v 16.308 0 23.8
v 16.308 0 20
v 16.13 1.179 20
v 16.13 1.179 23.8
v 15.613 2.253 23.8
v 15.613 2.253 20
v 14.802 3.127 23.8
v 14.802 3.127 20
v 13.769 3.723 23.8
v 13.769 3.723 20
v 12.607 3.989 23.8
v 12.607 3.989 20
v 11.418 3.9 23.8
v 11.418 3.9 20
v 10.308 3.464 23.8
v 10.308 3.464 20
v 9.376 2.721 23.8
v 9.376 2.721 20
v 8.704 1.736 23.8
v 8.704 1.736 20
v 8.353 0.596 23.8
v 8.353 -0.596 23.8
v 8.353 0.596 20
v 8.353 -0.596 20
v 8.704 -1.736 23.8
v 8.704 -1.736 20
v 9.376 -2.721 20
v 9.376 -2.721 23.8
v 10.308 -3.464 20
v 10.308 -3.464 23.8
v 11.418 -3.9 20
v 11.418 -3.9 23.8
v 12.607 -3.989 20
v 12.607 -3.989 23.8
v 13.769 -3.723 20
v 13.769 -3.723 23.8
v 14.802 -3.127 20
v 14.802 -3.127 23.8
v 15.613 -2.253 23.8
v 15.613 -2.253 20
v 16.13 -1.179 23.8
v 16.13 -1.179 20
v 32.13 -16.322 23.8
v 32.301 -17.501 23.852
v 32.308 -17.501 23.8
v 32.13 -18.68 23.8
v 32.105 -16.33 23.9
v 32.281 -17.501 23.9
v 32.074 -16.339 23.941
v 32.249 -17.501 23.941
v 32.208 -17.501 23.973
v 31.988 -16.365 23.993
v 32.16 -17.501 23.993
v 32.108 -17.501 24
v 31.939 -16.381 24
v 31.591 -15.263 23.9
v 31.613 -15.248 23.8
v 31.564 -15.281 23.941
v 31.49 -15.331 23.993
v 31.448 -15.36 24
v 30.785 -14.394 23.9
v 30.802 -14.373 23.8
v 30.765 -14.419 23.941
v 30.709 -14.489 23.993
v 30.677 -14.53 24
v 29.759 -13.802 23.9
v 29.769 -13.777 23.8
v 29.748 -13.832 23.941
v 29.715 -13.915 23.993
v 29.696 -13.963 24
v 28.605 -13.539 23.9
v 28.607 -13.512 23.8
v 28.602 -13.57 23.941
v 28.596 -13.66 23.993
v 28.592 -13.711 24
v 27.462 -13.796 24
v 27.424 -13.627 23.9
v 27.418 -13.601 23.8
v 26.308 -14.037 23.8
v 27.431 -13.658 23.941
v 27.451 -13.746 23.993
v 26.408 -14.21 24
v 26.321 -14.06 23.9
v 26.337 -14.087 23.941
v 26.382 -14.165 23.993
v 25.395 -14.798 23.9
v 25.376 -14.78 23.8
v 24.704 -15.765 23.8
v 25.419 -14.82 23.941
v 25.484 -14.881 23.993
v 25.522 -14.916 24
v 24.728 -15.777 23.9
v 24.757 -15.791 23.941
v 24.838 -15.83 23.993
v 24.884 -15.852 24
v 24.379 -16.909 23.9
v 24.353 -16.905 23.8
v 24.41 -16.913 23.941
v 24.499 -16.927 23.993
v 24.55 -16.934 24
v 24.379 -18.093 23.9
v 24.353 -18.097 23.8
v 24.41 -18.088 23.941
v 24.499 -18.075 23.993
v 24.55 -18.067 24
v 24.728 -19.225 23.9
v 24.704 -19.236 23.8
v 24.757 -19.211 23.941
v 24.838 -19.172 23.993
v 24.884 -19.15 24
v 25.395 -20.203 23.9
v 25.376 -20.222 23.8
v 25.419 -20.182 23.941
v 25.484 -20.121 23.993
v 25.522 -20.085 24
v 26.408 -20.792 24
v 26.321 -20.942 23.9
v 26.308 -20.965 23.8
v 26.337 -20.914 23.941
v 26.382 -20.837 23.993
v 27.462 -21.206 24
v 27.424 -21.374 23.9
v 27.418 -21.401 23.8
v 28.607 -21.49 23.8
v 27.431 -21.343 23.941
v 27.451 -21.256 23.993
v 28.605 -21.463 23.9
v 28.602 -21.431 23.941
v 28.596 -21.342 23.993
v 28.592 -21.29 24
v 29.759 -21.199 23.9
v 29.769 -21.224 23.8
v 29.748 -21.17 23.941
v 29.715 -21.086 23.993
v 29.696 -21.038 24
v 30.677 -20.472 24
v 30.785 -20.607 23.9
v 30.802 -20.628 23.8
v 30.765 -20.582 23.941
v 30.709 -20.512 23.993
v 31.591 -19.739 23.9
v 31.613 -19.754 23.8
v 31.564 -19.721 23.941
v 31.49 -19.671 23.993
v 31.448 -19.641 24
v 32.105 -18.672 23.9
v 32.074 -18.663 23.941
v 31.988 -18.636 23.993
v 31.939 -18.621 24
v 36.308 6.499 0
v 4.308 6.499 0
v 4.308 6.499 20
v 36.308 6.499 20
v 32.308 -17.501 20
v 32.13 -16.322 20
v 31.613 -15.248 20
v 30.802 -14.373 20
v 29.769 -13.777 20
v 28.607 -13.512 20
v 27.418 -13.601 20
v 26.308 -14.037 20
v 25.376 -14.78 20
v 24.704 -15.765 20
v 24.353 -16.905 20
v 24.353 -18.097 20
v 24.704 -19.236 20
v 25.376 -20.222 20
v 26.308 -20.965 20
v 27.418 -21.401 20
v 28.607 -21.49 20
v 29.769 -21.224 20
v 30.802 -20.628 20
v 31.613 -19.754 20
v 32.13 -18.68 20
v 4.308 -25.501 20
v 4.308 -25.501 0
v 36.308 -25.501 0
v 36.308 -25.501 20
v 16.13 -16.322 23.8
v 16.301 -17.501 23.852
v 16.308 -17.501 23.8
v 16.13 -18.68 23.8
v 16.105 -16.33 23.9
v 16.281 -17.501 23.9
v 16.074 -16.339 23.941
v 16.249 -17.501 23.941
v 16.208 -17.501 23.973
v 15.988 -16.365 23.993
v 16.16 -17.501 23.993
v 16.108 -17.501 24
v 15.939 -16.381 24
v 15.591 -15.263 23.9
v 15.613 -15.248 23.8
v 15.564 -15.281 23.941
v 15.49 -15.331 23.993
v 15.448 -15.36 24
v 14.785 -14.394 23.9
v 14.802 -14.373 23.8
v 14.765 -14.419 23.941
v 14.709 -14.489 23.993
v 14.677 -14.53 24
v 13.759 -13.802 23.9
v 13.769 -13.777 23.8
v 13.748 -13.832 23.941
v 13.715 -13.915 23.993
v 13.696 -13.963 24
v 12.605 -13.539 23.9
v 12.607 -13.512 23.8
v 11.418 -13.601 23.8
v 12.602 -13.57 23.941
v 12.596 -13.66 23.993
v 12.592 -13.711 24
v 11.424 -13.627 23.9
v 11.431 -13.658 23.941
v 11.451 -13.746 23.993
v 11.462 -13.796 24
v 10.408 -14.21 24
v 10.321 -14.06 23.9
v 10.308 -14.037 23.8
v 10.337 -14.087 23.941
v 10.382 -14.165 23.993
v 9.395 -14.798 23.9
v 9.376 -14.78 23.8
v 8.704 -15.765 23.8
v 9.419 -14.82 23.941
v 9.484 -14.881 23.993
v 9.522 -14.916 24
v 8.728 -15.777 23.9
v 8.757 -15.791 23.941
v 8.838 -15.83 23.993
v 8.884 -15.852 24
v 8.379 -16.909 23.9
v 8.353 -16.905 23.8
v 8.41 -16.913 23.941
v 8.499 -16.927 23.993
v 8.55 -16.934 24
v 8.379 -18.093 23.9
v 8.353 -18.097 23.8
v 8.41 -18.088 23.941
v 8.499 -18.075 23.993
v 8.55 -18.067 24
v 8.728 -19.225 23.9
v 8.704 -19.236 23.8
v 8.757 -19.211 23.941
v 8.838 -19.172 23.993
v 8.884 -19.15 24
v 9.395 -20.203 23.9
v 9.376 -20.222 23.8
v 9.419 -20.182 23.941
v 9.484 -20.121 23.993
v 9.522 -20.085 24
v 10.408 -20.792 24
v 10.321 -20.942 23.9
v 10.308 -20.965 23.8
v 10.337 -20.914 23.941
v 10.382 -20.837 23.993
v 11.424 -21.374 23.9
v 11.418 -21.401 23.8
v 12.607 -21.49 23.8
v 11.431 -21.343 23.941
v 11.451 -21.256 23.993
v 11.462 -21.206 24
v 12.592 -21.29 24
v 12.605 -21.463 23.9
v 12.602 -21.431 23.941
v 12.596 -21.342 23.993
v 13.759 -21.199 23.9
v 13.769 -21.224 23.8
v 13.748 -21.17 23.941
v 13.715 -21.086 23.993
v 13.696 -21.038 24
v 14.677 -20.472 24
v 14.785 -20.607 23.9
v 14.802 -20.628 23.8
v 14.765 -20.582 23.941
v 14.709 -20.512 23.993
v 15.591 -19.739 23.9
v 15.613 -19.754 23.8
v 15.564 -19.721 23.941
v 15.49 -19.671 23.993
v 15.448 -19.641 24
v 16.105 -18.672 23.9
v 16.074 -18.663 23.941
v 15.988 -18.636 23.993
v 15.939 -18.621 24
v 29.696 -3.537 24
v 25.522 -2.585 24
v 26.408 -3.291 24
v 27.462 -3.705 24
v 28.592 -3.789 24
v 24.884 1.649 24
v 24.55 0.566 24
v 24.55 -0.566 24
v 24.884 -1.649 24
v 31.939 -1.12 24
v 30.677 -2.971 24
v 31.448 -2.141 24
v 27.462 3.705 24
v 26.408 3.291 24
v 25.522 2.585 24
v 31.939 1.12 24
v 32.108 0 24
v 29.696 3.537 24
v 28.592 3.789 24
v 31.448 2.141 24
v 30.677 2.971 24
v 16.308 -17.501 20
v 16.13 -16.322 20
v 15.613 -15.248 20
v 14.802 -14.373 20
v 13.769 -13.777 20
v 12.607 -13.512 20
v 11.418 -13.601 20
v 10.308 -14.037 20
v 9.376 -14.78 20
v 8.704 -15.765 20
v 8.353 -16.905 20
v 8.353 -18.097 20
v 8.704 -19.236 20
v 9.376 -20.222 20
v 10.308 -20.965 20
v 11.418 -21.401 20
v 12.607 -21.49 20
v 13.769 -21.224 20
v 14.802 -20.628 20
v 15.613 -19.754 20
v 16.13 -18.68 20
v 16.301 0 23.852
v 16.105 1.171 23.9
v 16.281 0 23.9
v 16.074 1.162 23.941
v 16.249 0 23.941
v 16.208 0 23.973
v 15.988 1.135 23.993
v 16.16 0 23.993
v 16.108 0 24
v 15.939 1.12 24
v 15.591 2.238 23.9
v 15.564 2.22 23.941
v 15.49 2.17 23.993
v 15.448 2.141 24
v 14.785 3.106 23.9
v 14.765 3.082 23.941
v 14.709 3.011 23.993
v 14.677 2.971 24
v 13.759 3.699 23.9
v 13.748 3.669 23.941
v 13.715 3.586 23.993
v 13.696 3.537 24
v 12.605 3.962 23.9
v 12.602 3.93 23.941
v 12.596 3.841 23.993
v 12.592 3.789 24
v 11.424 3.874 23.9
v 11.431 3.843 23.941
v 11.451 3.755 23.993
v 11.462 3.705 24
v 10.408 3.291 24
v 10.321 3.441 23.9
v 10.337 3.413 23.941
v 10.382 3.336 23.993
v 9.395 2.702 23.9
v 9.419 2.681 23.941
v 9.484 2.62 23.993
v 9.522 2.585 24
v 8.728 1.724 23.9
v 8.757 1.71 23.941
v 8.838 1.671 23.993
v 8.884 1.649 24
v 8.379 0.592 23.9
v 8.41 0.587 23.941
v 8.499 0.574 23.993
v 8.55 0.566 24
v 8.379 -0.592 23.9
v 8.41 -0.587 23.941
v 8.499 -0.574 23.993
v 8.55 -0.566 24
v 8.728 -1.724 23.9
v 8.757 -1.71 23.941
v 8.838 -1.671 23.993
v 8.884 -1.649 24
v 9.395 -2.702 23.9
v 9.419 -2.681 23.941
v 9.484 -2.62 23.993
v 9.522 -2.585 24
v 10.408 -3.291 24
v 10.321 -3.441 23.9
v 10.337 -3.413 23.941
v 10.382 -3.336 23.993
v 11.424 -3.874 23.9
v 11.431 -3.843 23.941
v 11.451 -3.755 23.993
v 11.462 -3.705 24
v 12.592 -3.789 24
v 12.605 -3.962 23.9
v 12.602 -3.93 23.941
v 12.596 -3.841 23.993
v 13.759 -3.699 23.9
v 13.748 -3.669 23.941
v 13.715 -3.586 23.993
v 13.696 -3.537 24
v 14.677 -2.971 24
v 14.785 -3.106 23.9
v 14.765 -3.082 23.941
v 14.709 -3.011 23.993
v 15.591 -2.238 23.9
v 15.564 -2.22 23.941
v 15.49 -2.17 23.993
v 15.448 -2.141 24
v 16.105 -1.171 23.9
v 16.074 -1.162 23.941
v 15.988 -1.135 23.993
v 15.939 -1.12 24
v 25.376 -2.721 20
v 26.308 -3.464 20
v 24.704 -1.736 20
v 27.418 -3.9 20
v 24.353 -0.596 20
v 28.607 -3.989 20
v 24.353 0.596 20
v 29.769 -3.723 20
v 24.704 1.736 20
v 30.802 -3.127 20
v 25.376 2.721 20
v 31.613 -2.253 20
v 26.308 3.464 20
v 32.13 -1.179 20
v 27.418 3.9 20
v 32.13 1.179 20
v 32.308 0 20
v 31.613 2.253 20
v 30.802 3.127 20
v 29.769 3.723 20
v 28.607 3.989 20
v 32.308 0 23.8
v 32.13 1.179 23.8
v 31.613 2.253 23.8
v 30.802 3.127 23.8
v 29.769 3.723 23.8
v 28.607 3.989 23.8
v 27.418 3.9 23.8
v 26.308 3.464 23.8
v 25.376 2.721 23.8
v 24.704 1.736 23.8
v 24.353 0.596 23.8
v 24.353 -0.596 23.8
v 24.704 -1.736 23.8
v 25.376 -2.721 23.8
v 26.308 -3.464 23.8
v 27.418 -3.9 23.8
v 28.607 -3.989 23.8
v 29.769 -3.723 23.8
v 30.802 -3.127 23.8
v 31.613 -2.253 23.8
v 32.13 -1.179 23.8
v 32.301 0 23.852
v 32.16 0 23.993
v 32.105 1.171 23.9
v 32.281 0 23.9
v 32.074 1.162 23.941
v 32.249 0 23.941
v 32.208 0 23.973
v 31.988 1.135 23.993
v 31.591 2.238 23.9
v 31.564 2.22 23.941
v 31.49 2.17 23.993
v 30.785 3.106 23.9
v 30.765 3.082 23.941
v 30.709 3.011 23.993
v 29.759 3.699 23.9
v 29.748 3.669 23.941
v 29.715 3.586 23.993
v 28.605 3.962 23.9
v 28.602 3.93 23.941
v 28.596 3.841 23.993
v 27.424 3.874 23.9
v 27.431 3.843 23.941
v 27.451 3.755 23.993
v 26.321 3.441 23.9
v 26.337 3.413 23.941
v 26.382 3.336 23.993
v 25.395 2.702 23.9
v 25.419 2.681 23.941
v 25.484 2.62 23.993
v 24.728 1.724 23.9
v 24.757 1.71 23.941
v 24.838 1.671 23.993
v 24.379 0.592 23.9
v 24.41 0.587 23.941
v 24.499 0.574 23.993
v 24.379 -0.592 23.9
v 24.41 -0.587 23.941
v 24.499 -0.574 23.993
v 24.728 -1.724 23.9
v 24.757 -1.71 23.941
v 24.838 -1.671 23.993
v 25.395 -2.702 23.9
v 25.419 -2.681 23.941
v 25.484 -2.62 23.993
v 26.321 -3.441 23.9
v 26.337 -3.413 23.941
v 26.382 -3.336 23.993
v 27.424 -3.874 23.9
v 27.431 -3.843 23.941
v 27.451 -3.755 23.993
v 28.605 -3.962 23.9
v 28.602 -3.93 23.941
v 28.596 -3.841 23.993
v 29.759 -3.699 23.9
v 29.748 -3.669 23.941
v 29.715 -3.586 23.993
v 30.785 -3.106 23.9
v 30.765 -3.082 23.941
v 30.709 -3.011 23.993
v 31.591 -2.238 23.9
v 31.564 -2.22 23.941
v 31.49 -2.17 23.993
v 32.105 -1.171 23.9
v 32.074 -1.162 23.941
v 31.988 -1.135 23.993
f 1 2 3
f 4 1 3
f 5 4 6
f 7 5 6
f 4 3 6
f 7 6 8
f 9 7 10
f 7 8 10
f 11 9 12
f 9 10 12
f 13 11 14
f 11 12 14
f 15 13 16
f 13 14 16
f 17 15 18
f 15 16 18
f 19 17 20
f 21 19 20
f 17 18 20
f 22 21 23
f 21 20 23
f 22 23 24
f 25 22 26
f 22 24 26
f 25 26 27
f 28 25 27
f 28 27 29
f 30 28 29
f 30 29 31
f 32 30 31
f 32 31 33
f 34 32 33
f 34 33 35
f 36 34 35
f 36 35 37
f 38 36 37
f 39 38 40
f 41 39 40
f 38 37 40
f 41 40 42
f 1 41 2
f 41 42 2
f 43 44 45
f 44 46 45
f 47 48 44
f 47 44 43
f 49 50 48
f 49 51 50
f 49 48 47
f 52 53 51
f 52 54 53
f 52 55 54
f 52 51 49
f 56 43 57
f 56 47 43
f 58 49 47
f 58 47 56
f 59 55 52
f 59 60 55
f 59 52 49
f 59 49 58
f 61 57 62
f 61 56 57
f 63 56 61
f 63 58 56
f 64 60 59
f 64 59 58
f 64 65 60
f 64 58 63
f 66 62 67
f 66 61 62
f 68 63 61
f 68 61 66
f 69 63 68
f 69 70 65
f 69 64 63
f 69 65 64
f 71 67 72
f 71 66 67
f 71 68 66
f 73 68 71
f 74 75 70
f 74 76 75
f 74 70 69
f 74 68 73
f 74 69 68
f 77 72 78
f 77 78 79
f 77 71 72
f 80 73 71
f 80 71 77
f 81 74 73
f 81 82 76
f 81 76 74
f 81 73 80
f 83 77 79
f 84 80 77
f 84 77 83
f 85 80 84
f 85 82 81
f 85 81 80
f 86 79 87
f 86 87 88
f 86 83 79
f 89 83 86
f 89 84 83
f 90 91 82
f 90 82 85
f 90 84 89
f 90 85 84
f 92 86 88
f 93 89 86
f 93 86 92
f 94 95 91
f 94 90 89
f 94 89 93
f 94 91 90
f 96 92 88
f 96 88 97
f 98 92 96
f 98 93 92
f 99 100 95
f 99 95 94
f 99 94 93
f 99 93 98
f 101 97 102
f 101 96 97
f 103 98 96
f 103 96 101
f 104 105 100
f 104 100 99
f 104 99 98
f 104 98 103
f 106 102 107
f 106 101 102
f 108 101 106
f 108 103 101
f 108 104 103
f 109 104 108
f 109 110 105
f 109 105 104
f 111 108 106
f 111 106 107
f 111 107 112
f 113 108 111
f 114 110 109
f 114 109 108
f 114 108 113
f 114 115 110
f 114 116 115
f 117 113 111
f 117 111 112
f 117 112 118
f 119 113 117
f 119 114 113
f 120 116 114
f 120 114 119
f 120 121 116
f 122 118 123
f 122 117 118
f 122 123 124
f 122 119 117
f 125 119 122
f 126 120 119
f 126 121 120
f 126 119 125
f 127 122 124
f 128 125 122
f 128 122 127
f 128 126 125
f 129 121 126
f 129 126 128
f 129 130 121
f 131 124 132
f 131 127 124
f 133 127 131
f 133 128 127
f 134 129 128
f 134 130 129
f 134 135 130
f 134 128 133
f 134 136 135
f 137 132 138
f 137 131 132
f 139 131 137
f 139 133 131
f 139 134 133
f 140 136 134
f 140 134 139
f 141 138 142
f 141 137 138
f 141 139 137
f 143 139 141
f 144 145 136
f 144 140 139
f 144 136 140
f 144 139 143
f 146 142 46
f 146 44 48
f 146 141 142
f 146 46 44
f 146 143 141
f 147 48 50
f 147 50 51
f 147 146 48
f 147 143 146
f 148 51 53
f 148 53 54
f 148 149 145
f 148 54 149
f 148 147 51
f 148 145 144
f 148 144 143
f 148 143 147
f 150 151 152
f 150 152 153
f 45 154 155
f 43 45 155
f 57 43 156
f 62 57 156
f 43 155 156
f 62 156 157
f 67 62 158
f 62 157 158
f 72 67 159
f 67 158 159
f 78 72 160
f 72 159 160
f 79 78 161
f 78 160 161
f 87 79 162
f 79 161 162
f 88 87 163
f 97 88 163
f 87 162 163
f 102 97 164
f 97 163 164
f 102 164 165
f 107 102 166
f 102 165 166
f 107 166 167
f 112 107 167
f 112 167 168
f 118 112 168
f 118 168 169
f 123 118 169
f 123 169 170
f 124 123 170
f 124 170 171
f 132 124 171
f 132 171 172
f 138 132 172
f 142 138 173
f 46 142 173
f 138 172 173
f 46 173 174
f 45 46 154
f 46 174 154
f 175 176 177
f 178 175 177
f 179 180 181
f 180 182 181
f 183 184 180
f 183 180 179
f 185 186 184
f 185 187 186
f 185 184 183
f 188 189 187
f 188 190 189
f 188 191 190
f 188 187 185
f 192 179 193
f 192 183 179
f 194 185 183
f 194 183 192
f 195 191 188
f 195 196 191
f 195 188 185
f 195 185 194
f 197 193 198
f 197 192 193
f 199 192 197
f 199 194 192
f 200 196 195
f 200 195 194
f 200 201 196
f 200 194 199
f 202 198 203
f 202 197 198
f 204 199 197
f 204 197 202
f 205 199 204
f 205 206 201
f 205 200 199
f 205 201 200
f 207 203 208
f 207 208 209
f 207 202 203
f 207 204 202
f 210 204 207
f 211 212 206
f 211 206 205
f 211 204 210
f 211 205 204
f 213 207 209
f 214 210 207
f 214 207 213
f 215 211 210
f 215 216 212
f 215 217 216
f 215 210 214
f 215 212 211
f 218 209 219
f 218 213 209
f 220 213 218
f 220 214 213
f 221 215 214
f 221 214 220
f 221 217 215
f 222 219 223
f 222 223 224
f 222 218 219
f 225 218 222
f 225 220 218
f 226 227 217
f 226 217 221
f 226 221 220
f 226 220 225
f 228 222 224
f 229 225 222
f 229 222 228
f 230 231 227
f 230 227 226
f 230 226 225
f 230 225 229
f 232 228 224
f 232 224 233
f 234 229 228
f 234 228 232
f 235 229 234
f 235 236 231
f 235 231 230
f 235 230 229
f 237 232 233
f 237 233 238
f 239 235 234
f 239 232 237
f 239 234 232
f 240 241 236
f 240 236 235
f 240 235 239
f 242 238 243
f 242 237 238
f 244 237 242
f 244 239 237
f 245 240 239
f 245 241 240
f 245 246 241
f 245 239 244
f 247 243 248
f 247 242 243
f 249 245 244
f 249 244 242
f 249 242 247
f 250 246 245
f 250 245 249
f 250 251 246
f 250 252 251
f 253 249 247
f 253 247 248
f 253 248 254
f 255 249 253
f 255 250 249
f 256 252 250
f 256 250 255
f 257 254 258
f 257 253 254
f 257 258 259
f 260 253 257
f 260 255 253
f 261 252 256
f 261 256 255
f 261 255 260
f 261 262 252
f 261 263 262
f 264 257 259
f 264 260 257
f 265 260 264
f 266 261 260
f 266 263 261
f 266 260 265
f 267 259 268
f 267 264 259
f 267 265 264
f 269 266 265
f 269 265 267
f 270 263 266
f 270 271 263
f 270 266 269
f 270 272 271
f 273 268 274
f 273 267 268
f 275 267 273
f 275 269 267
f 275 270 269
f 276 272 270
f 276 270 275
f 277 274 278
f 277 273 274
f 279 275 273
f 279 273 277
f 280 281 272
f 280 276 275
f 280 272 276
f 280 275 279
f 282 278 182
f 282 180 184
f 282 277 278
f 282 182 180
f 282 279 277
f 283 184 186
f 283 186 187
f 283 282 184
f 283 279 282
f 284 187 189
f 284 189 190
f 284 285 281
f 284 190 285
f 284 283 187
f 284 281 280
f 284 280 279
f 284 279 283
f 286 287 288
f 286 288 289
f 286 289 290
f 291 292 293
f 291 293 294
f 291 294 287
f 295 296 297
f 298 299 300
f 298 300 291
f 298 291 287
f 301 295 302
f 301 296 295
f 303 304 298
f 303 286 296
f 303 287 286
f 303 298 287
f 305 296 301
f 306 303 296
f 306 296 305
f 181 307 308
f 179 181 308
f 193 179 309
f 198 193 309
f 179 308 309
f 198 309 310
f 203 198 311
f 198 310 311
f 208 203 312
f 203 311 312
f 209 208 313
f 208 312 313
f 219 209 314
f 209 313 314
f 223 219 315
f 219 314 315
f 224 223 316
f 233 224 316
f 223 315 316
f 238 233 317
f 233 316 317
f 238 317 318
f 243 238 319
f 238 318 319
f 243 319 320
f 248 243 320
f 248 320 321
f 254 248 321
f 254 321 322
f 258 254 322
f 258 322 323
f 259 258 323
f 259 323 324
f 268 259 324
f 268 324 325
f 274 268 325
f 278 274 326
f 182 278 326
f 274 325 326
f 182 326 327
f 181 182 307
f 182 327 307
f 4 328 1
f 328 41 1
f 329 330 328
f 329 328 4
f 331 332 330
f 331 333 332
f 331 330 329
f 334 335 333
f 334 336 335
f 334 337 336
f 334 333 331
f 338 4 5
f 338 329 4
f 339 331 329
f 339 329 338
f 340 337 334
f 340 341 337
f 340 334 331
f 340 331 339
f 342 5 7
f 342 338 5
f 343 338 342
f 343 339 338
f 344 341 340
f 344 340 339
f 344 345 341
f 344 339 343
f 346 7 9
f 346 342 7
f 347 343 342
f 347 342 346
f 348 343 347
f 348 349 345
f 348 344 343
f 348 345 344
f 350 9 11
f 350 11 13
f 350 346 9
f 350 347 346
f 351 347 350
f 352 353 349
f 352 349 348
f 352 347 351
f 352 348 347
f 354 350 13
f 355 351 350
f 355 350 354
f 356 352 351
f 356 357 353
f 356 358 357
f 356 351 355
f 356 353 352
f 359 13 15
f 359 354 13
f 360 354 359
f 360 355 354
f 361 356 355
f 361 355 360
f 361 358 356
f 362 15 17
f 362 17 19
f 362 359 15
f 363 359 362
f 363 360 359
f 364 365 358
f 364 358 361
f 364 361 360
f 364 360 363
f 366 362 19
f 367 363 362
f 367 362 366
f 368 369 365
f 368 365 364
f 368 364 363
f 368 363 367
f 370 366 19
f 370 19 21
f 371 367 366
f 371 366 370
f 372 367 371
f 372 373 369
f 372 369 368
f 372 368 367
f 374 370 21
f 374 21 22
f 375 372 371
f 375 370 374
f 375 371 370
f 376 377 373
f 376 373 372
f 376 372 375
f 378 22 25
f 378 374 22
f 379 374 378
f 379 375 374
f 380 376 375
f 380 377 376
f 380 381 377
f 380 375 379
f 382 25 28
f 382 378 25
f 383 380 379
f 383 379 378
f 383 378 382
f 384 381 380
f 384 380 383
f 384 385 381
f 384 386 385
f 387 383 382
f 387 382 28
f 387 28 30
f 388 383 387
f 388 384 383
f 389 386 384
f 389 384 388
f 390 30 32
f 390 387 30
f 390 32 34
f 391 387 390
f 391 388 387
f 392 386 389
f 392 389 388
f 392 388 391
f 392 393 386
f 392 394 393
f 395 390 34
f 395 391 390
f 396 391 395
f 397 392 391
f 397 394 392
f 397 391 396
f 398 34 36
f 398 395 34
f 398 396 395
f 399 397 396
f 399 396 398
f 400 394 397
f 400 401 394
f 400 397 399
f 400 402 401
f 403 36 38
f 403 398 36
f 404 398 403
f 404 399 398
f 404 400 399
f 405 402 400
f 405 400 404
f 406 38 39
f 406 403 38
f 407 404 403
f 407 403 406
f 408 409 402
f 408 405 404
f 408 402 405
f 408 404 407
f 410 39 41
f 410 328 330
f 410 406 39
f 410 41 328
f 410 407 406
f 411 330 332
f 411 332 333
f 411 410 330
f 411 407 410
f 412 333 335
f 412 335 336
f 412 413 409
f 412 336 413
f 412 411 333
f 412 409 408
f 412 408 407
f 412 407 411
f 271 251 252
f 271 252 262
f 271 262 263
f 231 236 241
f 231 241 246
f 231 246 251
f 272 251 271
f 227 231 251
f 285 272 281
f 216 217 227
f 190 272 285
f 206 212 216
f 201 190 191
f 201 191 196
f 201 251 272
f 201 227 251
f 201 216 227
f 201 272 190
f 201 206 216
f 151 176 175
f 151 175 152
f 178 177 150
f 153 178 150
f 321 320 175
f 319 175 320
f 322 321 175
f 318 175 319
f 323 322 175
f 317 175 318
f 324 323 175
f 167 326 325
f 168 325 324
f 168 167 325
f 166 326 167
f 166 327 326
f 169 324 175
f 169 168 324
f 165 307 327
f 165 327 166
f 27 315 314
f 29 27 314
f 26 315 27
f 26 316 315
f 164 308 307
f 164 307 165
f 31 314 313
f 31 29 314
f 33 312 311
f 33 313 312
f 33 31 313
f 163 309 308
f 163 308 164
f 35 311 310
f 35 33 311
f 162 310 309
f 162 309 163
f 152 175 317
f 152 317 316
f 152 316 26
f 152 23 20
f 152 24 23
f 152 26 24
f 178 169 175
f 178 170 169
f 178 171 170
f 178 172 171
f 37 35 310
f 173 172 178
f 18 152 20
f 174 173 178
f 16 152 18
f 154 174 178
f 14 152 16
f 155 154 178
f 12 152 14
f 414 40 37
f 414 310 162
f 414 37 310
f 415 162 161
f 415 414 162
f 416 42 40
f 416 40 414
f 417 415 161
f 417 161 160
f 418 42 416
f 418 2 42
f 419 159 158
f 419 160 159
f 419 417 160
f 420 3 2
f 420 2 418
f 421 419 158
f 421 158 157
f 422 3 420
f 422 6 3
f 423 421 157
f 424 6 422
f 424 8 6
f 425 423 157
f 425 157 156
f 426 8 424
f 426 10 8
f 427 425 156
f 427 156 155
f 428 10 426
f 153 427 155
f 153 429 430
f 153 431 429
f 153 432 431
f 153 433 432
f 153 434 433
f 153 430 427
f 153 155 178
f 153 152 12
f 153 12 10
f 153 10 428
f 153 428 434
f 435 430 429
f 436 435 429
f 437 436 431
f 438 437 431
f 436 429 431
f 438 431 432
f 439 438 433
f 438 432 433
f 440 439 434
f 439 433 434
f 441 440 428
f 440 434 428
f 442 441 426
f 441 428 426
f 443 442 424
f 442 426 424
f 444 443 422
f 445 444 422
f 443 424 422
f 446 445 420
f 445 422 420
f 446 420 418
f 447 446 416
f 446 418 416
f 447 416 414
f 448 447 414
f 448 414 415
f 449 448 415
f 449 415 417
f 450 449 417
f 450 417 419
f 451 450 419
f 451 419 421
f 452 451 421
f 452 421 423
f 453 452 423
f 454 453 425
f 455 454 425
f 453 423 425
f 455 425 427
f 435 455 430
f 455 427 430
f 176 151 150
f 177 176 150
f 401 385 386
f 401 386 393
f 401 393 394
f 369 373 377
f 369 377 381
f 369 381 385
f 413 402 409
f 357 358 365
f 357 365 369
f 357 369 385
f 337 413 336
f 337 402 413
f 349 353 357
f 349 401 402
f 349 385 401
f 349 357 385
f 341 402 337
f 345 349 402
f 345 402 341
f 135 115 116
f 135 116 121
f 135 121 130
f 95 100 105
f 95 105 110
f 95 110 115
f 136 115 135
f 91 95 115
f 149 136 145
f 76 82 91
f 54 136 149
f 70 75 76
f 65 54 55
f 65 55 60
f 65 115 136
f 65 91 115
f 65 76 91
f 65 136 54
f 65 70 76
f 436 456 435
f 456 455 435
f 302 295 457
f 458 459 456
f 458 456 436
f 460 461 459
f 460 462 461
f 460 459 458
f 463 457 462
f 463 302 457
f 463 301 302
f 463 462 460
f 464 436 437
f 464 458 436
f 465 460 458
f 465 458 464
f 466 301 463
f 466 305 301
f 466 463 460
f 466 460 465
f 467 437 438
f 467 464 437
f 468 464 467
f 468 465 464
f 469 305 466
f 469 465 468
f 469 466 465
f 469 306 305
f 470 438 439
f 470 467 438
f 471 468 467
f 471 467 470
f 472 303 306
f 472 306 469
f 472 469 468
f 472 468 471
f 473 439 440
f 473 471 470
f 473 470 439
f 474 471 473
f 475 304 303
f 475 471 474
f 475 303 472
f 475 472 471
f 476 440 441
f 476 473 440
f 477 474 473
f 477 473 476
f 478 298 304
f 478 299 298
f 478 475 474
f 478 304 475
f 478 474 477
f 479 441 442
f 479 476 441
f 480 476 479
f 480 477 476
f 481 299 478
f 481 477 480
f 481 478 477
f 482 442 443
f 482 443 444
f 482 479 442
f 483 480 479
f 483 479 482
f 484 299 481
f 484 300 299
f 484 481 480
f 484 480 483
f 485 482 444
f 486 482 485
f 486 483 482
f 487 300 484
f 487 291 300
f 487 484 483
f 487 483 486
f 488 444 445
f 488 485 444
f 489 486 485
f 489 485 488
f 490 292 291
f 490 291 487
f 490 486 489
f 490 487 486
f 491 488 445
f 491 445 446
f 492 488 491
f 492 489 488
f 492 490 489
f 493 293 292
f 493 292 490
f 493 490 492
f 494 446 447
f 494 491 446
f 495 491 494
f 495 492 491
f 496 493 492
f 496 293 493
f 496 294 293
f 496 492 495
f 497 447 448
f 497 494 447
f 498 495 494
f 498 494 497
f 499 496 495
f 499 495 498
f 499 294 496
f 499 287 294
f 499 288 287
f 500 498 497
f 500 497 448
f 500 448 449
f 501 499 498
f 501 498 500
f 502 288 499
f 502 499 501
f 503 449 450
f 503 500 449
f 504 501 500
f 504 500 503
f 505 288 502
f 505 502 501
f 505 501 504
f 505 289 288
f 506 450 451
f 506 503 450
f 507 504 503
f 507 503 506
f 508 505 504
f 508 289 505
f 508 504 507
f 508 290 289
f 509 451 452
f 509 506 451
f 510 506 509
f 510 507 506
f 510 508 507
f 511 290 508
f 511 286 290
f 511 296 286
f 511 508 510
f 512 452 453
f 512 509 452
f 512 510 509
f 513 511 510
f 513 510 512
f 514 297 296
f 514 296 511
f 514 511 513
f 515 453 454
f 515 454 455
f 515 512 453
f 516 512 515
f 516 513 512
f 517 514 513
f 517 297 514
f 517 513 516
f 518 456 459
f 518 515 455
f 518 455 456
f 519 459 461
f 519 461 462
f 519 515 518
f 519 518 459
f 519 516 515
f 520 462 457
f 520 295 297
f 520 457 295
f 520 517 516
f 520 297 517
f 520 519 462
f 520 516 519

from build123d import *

# Parameters (mm, degrees)
F0_W      = 32
F0_H      = 32
F1_DEPTH  = 20
F2_R      = 4
F3_DEPTH  = 4
F4_R      = 4
F5_DEPTH  = 4
F7_R      = 4
F8_DEPTH  = 4
F10_R     = 4
F11_DEPTH = 4
F12_R     = 0.2
F13_R     = 0.2
F14_R     = 0.2
F15_R     = 0.2


with BuildPart() as f1:
    # F0 (on Top) → F1 (new body)
    with BuildSketch(Plane.XY):
        with Locations((20.307853, -9.500817)):
            Rectangle(F0_W, F0_H)
    extrude(amount=F1_DEPTH)

    # F2 (on face) → F3 (join)
    with BuildSketch(Plane.XY.offset(20)):
        with Locations((12.307853, 0)):
            Circle(F2_R)
    extrude(amount=F3_DEPTH)

    # F4 (on face) → F5 (join)
    with BuildSketch(Plane.XY.offset(20)):
        with Locations((28.307853, 0)):
            Circle(F4_R)
    extrude(amount=F5_DEPTH)

    # F7 (on face) → F8 (join)
    with BuildSketch(Plane.XY.offset(20)):
        with Locations((12.307853, -17.500817)):
            Circle(F7_R)
    extrude(amount=F8_DEPTH)

    # F10 (on face) → F11 (join)
    with BuildSketch(Plane.XY.offset(20)):
        with Locations((28.307853, -17.500817)):
            Circle(F10_R)
    extrude(amount=F11_DEPTH)

    # F12
    f12_edges = [f1.edges().sort_by_distance(p)[0] for p in [
        (8.307853, 0, 24),
    ]]
    fillet(f12_edges, radius=F12_R)

    # F13
    f13_edges = [f1.edges().sort_by_distance(p)[0] for p in [
        (8.307853, -17.500817, 24),
    ]]
    fillet(f13_edges, radius=F13_R)

    # F14
    f14_edges = [f1.edges().sort_by_distance(p)[0] for p in [
        (24.307853, -17.500817, 24),
    ]]
    fillet(f14_edges, radius=F14_R)

    # F15
    f15_edges = [f1.edges().sort_by_distance(p)[0] for p in [
        (24.307853, 0, 24),
    ]]
    fillet(f15_edges, radius=F15_R)


solid = f1.part
